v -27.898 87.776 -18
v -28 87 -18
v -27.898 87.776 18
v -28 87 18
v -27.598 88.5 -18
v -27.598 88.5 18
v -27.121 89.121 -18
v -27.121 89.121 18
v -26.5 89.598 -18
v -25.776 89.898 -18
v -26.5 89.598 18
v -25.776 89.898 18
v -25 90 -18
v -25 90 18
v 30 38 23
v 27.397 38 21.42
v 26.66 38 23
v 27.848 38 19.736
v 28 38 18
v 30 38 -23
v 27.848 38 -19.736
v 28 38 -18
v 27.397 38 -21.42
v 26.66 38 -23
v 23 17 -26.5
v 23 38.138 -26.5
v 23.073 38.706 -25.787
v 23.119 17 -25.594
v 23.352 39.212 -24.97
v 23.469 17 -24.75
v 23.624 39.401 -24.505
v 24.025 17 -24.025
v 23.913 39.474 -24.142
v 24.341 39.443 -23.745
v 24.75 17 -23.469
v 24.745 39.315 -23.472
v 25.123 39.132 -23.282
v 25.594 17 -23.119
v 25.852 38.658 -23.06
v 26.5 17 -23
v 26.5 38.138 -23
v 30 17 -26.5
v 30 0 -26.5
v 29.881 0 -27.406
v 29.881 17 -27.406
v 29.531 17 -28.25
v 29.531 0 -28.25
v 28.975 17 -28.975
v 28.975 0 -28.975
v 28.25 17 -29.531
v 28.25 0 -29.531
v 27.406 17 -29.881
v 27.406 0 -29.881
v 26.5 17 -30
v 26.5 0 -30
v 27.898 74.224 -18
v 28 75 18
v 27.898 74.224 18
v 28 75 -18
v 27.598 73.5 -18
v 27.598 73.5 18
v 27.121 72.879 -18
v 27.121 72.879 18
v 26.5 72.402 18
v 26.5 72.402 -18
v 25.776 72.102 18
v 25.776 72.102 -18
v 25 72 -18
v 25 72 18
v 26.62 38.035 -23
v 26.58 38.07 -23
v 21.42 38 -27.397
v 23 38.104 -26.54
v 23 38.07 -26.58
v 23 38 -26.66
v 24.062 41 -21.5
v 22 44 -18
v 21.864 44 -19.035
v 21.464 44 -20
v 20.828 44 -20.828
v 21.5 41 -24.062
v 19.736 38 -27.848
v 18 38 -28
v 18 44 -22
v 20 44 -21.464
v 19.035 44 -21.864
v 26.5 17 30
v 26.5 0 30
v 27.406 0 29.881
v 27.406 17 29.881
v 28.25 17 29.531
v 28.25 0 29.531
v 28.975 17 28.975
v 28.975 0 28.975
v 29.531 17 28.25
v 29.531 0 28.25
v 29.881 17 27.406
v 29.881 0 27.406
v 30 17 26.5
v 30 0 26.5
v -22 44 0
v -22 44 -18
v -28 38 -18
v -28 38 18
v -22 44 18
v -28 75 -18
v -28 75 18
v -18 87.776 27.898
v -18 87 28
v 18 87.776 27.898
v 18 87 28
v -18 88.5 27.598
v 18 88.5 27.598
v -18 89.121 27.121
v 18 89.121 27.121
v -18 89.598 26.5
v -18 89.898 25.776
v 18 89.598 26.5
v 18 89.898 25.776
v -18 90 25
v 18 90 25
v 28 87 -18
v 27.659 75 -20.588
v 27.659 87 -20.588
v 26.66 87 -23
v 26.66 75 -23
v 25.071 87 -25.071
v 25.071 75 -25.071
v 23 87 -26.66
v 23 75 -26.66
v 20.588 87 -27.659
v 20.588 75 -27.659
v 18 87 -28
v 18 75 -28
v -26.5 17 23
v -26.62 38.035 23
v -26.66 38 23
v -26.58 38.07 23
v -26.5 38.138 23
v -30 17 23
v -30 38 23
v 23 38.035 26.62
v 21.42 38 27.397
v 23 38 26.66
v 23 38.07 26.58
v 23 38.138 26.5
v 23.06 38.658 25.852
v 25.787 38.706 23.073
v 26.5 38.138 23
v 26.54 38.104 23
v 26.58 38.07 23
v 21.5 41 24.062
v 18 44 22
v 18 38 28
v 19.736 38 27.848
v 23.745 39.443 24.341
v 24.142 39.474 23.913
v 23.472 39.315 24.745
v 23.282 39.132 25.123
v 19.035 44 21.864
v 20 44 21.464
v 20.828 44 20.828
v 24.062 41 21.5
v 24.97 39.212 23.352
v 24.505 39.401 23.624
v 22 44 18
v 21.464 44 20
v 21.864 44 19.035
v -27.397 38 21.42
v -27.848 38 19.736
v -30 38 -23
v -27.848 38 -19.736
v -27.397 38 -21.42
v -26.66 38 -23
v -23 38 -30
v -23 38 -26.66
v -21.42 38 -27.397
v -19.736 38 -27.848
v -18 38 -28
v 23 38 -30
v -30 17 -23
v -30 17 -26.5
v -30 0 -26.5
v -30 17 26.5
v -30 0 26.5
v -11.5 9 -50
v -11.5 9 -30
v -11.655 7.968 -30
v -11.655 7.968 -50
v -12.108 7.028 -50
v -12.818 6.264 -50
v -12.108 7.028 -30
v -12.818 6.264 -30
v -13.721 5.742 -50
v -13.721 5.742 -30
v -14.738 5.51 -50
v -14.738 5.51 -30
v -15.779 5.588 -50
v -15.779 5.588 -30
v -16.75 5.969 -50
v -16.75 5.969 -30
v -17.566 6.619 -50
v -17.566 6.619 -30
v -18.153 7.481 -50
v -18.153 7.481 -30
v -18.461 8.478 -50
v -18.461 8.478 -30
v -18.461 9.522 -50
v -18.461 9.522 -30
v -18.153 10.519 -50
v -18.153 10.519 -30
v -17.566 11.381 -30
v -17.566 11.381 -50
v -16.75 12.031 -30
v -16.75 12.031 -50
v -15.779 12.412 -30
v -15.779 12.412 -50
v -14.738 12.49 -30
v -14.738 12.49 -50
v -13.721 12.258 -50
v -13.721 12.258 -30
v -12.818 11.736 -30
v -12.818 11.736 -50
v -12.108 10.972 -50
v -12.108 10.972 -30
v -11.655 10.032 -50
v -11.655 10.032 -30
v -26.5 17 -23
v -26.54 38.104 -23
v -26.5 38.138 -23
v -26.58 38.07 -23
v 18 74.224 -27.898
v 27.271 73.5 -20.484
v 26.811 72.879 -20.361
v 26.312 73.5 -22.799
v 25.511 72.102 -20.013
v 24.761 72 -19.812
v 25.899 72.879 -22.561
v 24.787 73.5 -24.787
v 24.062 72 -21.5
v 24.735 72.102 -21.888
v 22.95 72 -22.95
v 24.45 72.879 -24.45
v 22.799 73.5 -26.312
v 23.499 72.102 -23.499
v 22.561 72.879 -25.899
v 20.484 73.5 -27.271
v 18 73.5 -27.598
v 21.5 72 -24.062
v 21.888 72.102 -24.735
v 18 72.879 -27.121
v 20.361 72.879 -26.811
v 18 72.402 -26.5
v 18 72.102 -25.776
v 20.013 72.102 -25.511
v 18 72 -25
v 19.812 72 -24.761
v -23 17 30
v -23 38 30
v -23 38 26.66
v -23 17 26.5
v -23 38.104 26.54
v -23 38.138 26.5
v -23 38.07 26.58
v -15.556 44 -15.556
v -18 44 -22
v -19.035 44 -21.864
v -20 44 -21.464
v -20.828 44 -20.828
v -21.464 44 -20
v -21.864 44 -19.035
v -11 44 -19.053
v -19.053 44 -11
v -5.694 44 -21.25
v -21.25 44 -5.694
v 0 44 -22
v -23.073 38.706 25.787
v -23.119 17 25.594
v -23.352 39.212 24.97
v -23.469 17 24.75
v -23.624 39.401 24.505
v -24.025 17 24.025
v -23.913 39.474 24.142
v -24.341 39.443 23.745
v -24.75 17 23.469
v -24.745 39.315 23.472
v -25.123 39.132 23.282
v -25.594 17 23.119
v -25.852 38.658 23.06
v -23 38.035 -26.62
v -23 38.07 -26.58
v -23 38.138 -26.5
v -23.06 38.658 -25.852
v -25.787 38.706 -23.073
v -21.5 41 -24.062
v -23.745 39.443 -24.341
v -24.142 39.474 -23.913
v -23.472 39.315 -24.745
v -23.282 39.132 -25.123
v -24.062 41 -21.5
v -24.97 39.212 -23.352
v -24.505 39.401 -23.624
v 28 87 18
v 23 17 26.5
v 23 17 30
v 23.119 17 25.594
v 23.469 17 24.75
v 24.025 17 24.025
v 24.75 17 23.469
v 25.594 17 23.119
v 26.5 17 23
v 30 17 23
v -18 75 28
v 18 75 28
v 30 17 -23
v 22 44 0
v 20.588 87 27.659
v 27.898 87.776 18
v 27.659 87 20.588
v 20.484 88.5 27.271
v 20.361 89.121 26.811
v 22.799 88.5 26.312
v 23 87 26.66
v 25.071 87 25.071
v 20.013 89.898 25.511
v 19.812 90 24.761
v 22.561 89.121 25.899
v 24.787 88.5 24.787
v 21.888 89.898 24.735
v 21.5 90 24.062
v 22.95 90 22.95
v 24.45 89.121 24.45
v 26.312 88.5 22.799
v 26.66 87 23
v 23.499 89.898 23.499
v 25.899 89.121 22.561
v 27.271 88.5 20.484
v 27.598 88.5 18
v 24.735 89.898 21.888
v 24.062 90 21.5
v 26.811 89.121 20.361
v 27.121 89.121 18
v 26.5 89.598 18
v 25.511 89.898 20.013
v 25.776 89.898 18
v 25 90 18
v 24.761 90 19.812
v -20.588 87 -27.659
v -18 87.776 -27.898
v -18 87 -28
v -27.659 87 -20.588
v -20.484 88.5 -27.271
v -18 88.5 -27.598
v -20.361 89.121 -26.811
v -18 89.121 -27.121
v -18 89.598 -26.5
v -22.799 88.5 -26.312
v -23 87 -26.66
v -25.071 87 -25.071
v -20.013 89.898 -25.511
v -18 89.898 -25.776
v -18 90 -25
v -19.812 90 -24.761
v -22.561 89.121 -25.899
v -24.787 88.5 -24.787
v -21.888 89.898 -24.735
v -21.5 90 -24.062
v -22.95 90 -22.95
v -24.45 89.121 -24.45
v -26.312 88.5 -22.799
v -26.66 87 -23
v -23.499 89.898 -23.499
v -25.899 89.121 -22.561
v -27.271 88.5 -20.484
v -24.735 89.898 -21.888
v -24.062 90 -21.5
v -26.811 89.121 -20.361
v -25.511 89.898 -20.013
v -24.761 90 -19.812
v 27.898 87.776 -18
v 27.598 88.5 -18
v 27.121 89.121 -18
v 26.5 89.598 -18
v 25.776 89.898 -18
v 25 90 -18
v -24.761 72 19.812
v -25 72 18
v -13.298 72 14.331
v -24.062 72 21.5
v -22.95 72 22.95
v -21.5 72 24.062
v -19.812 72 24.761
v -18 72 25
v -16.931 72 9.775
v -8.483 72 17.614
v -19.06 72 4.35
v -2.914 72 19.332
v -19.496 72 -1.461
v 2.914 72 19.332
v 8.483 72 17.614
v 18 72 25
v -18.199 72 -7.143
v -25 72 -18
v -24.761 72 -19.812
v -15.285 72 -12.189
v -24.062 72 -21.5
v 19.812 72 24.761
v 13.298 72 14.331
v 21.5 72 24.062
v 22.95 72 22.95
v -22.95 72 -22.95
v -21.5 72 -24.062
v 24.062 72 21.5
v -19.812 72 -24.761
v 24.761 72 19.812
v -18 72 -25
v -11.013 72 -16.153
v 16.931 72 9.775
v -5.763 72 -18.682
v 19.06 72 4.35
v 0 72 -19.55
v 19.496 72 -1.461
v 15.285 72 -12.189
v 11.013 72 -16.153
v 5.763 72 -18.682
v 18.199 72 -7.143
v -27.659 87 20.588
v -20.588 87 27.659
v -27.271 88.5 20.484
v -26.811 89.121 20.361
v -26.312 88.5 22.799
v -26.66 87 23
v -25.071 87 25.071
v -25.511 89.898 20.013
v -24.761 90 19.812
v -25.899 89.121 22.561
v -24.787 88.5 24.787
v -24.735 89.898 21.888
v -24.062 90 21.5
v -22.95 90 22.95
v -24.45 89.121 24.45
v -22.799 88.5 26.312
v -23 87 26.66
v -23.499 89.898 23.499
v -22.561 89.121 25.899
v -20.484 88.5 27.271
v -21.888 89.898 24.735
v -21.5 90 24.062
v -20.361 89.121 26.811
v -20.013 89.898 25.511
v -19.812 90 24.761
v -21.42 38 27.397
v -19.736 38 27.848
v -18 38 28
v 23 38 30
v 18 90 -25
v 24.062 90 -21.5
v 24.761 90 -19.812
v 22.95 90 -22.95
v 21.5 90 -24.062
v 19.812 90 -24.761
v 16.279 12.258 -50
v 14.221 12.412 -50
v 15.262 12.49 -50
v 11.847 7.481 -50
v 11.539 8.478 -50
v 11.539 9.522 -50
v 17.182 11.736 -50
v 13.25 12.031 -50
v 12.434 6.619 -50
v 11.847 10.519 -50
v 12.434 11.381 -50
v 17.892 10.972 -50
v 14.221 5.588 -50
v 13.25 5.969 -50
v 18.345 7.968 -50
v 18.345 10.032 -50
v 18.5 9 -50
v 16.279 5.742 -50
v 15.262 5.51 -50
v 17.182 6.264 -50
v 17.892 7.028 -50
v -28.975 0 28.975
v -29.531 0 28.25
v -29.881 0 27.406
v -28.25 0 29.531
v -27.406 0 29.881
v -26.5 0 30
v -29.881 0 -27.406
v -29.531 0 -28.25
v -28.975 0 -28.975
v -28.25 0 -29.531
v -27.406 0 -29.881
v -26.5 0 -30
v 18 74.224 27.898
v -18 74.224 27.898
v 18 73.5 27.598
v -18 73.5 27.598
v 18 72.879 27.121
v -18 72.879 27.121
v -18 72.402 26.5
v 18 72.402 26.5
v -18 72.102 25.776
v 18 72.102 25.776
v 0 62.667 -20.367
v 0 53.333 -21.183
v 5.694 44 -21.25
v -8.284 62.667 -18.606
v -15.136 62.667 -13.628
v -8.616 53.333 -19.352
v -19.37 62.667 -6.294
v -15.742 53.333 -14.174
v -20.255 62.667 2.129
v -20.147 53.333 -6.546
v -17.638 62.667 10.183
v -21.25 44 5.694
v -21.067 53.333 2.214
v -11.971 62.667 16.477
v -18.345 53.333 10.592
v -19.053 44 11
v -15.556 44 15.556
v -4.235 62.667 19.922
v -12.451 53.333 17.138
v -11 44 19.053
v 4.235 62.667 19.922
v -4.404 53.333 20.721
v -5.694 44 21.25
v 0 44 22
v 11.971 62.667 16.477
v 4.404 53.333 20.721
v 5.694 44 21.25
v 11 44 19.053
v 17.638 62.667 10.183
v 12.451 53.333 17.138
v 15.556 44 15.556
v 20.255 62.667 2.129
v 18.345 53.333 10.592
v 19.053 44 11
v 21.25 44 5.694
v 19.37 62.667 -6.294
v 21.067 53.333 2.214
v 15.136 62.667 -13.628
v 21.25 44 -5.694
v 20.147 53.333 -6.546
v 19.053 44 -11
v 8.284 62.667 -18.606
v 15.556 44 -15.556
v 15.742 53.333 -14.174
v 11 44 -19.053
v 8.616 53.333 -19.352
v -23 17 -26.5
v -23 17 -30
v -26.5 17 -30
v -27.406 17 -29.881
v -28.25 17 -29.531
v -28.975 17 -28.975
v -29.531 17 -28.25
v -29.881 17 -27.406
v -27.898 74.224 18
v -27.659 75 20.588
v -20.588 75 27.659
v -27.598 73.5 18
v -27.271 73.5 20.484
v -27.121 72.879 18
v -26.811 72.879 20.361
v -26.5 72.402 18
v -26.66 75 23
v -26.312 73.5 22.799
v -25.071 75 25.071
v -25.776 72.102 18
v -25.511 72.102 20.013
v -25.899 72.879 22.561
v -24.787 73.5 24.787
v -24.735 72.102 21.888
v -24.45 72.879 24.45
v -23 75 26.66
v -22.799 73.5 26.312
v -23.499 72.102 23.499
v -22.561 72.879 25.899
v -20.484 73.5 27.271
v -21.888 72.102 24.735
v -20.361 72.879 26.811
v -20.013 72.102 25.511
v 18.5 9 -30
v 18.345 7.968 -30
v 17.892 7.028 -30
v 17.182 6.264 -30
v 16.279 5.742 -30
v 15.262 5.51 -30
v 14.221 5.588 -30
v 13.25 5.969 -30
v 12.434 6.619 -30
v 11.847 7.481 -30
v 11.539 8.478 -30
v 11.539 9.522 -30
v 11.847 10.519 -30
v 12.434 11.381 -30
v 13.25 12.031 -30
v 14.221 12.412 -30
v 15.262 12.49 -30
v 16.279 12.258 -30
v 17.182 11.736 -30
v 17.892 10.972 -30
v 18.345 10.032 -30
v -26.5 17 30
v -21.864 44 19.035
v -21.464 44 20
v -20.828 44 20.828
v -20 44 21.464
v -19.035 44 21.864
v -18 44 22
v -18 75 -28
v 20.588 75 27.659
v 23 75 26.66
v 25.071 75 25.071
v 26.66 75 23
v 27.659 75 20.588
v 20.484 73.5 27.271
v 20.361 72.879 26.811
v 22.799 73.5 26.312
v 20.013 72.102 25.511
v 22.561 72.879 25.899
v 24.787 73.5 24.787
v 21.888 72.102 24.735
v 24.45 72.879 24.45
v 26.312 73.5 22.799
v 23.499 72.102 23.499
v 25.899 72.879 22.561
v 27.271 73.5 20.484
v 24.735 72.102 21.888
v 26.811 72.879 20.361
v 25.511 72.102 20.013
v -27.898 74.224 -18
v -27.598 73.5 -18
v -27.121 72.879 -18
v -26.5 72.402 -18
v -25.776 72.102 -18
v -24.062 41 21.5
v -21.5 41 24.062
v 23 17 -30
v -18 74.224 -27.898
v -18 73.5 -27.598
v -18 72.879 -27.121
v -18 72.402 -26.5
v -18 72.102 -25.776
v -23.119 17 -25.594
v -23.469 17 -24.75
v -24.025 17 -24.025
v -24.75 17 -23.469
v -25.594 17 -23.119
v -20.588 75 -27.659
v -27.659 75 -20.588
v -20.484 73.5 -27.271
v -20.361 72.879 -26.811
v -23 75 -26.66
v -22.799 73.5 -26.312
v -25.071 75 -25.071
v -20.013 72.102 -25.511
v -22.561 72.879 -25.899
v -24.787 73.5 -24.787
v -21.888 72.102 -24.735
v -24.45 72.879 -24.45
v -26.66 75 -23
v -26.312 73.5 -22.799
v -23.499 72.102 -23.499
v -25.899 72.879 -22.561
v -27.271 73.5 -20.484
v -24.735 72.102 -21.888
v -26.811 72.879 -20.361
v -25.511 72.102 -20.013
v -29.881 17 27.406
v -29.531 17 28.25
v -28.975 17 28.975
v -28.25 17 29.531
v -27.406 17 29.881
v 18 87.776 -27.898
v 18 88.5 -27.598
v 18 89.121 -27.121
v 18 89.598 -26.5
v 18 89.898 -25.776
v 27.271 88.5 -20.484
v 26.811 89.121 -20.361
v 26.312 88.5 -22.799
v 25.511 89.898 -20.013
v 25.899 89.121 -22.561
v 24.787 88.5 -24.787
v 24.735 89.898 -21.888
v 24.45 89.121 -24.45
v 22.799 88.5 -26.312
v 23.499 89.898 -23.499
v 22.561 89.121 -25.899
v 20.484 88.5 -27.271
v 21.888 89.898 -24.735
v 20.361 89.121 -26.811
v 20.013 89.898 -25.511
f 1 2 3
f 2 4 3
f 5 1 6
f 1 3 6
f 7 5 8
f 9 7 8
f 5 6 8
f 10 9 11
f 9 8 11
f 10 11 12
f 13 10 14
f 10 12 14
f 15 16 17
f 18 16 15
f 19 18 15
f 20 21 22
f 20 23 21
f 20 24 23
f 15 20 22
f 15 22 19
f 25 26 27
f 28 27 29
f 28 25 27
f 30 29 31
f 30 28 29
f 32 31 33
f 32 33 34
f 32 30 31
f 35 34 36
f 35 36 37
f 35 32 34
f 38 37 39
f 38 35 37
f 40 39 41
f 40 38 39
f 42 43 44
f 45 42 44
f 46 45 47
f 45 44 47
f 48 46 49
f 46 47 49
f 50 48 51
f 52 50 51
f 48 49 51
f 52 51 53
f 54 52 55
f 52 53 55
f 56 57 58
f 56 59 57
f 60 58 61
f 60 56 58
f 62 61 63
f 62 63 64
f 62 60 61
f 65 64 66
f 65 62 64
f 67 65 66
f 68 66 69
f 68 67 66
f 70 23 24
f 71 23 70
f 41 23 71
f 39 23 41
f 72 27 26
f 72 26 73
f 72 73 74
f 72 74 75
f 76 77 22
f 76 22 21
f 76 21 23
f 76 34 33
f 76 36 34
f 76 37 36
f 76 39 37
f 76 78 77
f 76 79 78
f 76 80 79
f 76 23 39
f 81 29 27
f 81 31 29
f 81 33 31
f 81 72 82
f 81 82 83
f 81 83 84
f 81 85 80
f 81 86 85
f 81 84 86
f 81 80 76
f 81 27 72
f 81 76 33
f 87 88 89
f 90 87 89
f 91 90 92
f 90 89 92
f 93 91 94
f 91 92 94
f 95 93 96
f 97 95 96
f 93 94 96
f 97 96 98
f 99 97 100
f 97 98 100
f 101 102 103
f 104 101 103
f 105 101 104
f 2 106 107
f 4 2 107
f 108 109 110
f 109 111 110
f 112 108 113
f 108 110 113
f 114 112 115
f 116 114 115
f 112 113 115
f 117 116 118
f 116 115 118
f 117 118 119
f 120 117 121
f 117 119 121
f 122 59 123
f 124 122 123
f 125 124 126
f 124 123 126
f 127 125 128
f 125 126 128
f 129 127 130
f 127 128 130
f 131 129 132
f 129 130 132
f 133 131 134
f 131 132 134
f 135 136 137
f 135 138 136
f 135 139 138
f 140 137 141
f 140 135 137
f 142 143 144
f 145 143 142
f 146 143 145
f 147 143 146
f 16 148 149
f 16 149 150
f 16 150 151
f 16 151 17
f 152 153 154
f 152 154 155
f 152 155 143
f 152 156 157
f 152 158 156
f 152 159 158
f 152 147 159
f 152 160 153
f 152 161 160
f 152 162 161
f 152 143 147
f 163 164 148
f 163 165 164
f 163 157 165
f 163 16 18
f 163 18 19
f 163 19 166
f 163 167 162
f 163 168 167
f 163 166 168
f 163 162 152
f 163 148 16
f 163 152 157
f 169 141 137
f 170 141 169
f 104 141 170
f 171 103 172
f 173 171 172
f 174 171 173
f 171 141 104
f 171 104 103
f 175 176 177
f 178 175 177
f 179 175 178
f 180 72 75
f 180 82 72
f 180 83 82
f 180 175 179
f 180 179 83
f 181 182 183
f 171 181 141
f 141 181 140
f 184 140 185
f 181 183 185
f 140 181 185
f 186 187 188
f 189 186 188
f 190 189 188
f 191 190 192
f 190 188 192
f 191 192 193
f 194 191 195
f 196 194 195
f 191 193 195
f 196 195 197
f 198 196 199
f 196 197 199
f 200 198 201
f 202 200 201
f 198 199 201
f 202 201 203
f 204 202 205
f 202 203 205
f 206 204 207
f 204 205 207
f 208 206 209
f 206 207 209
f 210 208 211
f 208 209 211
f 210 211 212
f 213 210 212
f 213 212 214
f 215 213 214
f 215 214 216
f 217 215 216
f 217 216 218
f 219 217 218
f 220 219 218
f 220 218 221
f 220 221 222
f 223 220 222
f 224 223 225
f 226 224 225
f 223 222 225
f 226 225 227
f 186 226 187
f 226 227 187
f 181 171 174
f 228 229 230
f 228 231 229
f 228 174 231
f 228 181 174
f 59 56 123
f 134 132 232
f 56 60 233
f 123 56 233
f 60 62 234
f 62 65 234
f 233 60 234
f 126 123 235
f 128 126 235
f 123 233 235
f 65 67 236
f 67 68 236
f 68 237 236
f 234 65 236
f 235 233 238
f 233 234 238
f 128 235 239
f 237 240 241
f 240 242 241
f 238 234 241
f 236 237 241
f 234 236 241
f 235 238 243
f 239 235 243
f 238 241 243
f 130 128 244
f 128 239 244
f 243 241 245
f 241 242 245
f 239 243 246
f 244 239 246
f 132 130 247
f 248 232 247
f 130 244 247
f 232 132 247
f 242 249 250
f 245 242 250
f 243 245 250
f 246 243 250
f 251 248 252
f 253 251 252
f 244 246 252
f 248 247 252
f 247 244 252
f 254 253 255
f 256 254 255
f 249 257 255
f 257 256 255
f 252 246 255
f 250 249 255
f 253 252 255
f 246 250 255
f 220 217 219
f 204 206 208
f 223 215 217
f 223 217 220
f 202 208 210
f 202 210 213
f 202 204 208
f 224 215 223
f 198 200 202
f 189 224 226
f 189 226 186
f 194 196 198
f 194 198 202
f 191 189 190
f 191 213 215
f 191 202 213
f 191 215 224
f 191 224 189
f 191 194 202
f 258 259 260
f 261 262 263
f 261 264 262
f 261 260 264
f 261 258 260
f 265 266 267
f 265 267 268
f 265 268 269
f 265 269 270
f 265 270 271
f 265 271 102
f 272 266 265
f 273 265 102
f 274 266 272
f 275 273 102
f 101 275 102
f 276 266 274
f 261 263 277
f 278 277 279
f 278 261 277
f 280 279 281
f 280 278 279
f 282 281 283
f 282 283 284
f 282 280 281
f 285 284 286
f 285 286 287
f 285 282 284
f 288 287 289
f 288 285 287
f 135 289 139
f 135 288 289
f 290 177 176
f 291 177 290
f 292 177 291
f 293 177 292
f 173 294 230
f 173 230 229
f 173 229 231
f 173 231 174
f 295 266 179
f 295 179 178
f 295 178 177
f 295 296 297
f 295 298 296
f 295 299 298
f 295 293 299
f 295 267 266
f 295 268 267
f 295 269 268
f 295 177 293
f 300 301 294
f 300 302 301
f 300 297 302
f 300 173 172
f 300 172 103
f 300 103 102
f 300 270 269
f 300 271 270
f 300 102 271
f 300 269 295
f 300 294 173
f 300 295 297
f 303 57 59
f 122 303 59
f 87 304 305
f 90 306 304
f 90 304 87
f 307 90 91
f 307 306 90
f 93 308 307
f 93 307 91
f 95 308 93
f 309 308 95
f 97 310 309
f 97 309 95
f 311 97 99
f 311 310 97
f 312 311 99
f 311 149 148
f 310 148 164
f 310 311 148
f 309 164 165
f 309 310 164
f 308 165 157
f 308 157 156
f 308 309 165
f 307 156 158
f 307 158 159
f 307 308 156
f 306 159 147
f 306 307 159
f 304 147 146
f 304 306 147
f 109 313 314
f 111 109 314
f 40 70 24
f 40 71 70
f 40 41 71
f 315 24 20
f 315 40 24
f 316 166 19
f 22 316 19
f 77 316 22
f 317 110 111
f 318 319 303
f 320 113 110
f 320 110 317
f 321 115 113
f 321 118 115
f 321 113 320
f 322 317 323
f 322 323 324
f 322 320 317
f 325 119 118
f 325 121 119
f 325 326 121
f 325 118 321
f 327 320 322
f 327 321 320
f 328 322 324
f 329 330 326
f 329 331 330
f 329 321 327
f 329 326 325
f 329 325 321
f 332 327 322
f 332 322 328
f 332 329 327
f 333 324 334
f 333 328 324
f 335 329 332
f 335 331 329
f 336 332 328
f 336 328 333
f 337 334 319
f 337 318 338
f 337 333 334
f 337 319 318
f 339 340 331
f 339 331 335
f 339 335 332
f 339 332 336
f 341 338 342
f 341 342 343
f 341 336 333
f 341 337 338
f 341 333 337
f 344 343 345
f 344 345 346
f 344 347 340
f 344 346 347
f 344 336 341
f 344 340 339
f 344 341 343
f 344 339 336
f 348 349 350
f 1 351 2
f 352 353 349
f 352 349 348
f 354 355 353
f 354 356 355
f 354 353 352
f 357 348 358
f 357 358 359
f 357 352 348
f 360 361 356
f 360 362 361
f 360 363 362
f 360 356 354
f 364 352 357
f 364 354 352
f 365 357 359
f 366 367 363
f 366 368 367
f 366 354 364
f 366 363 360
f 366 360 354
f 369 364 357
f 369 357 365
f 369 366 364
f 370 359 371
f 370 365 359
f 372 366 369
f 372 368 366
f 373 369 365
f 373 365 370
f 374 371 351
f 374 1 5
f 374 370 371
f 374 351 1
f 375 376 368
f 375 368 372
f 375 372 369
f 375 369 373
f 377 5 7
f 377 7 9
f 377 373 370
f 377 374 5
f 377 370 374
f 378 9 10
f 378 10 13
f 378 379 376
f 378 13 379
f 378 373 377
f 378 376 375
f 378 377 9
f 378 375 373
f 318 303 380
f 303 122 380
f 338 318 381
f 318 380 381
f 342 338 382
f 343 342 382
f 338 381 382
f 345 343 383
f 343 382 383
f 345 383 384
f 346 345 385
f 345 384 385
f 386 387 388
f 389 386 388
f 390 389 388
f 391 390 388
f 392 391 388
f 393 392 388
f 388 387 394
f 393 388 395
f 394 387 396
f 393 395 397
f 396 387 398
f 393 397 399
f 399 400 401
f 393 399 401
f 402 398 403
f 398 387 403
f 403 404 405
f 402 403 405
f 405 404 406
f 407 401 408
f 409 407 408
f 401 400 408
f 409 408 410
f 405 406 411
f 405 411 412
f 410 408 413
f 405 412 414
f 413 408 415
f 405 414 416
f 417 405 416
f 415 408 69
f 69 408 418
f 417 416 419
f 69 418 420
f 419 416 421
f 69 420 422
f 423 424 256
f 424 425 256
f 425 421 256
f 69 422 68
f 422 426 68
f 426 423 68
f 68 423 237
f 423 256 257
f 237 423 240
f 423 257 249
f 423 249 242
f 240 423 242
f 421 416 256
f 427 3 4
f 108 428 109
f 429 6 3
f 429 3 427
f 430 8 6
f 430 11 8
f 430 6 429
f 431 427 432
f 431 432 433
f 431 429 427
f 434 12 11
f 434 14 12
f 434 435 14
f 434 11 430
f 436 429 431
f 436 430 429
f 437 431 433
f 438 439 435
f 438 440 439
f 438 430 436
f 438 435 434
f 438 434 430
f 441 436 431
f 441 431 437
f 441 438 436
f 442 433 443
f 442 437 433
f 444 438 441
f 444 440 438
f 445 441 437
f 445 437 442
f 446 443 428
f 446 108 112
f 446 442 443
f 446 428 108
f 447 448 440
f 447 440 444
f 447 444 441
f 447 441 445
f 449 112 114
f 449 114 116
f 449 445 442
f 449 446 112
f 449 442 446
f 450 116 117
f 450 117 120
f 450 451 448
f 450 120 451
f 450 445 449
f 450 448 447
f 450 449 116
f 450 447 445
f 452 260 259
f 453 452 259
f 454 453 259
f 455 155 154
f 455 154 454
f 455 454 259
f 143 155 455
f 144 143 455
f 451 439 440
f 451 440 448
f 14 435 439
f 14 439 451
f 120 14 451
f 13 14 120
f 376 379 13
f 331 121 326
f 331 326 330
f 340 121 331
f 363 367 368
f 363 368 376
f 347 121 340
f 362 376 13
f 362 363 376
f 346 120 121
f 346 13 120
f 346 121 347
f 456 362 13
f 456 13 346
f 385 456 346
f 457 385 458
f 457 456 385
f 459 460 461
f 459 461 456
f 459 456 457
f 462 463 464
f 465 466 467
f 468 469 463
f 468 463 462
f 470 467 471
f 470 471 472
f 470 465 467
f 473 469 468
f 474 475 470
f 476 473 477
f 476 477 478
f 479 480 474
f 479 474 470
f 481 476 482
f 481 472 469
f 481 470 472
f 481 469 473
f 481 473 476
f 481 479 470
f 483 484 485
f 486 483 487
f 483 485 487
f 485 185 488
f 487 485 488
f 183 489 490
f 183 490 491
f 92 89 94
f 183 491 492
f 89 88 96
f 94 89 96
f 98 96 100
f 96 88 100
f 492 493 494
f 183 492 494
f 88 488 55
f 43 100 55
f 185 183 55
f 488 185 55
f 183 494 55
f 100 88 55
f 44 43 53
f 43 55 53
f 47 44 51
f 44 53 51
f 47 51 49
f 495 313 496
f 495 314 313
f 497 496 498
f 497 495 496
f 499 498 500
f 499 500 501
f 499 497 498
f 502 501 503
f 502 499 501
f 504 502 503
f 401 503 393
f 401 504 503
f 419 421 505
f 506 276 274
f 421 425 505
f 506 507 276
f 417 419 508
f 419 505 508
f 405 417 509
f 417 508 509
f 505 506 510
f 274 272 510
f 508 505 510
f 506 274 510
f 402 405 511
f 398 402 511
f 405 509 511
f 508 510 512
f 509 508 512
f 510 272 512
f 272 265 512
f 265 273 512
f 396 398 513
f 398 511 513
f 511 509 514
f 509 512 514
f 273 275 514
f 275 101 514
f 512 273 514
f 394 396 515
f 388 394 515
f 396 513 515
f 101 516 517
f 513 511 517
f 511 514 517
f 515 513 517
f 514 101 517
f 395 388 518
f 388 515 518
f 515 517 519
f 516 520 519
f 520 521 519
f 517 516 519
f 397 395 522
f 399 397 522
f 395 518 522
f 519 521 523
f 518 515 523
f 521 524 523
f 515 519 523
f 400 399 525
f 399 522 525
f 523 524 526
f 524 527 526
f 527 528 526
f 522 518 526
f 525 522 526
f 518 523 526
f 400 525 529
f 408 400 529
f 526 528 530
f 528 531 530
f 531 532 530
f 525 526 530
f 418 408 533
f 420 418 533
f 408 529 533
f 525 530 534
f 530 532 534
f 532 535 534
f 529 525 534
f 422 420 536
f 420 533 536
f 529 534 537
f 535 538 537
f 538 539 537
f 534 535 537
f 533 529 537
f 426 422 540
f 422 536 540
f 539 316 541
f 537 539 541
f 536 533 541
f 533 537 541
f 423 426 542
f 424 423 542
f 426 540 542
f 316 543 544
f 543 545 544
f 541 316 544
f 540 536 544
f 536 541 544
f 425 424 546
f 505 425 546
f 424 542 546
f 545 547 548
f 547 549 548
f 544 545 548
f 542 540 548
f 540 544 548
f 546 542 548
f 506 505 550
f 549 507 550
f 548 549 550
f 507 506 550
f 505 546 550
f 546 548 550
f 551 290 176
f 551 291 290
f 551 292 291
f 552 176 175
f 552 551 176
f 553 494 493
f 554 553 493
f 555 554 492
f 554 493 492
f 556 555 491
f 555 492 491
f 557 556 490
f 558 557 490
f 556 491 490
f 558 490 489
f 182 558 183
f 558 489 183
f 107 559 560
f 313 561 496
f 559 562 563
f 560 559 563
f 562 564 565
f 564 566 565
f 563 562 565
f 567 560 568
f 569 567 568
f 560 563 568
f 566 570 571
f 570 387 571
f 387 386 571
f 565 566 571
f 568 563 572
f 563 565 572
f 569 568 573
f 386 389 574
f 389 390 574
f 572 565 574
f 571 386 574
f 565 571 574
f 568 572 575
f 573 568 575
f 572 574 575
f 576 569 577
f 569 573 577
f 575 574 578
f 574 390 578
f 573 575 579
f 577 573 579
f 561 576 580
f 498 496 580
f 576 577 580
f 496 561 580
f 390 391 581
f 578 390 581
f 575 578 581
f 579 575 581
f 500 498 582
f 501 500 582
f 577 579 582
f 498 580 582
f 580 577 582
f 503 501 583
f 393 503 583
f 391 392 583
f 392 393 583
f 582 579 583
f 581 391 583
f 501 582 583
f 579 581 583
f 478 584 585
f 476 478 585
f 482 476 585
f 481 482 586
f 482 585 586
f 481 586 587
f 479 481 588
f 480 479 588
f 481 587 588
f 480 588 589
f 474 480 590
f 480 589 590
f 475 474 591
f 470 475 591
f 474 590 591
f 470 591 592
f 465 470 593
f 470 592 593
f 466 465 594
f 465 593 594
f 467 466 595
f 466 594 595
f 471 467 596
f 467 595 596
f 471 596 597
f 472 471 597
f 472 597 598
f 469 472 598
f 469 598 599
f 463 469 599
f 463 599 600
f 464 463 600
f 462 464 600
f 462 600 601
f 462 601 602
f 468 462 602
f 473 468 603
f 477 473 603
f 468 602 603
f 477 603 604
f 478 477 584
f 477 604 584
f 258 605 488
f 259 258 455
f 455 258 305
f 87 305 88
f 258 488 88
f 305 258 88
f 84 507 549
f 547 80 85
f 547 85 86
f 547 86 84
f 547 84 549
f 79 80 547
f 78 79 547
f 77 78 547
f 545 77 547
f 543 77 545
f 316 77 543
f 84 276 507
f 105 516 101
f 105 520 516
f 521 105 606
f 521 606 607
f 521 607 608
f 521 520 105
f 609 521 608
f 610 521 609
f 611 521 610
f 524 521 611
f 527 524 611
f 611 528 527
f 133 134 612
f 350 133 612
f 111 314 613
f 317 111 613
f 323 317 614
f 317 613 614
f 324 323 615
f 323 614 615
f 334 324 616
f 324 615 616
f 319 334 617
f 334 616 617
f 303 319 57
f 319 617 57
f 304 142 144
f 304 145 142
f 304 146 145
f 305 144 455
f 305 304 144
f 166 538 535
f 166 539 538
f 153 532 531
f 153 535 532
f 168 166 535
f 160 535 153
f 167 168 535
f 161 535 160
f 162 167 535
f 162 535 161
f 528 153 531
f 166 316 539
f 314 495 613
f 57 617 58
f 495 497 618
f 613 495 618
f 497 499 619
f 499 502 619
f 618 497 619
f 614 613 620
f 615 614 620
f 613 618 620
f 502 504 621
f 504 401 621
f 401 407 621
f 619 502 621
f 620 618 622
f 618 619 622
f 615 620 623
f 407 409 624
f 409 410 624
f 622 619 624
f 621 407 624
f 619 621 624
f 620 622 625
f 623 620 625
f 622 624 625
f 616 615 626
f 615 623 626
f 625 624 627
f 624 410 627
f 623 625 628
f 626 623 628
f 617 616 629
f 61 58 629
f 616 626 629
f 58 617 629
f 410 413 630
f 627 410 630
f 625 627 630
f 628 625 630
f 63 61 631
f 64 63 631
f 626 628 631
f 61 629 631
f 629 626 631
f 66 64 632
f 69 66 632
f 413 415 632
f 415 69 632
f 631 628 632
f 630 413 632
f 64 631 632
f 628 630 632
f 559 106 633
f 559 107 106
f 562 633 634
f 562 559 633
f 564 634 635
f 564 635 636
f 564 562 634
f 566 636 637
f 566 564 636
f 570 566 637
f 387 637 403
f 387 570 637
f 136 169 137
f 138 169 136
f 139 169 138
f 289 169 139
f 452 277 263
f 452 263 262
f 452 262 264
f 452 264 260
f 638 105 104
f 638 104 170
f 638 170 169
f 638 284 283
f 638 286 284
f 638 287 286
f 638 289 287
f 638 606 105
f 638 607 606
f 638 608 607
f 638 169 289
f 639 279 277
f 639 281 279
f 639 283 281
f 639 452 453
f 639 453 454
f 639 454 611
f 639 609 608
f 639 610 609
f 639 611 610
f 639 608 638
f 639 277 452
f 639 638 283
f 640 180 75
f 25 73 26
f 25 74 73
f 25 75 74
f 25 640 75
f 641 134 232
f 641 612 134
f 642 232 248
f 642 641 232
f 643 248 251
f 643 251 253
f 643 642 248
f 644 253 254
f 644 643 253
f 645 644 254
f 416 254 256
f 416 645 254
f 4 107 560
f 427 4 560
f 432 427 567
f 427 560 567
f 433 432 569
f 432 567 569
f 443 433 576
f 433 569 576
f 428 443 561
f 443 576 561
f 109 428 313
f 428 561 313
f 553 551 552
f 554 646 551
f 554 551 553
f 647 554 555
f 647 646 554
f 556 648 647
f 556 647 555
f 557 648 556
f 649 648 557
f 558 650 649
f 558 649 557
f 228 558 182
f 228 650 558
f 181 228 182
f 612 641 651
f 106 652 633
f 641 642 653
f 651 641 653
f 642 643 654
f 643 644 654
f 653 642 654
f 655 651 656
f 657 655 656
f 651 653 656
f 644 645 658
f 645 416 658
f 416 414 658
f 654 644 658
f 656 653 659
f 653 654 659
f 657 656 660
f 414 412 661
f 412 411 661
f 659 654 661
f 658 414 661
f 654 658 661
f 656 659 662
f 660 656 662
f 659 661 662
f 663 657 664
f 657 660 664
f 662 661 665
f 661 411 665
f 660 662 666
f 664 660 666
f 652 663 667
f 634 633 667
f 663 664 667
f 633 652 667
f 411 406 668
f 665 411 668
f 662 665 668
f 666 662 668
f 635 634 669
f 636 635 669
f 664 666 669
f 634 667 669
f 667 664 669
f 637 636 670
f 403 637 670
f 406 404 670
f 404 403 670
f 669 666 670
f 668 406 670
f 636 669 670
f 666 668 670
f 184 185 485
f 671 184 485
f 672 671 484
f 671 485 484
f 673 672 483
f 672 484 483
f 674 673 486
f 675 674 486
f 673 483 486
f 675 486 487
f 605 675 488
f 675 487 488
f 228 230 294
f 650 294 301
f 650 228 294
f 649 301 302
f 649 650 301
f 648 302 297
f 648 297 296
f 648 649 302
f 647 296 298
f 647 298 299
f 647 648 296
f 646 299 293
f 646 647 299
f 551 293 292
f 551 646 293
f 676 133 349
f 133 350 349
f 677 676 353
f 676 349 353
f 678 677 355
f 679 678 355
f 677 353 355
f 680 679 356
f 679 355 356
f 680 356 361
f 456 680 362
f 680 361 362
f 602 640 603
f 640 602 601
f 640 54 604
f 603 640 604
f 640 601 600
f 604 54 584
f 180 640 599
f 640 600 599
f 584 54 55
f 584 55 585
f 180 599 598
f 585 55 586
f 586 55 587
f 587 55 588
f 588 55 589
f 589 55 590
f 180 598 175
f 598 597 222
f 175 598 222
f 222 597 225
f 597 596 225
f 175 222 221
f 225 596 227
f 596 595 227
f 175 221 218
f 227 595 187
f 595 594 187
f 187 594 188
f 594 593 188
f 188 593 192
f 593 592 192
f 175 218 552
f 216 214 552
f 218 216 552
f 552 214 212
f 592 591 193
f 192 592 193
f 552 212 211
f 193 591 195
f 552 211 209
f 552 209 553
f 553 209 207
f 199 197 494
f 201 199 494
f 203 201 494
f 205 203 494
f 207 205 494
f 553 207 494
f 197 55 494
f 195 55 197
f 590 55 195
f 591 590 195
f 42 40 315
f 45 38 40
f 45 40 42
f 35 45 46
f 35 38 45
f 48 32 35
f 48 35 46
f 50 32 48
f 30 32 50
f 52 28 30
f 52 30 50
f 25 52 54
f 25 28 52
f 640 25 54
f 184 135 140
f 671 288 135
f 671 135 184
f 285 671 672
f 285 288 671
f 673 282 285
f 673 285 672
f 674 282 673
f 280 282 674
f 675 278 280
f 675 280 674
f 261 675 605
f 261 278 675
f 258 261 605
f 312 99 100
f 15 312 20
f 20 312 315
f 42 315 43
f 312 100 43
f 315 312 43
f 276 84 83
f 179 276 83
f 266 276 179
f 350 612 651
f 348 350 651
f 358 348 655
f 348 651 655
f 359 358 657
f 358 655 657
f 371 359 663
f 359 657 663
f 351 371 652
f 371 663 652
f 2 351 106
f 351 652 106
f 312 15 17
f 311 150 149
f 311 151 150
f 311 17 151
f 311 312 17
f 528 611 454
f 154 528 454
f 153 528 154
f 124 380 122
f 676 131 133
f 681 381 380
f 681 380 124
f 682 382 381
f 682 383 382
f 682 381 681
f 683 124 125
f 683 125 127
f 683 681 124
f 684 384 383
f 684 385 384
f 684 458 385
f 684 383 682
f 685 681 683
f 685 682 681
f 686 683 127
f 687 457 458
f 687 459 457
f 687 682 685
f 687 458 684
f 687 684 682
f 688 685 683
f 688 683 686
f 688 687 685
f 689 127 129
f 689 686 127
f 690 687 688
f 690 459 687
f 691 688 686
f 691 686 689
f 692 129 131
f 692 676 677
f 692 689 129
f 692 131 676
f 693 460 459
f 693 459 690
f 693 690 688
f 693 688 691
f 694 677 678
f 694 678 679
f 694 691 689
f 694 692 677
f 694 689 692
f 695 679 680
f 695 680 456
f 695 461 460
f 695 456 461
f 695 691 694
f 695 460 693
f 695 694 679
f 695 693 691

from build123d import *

# Parameters (mm, degrees)
BOSS_EXTRUDE1_DEPTH = 38
BOSS_EXTRUDE2_DEPTH = 6
BOSS_EXTRUDE2_TAPER = 45
CUT_EXTRUDE3_START  = -21
CUT_EXTRUDE3_DEPTH  = 78.956123464
CIRPATTERN1_COUNT   = 4
SKETCH5_R           = 3.5
BOSS_EXTRUDE3_DEPTH = 20
BOSS_EXTRUDE4_DEPTH = 18
FILLET1_R           = 3


with BuildPart() as part:
    # Sketch1 → Boss-Extrude1 (new body)
    with BuildSketch(Plane(origin=(0, 0, 0), x_dir=(1, 0, 0), z_dir=(0, 1, 0))):
        with BuildLine():
            Line((-26.5, -30), (26.5, -30))
            ThreePointArc((26.5, -30), (28.974873734, -28.974873734), (30, -26.5))
            Line((30, -26.5), (30, 26.5))
            ThreePointArc((30, 26.5), (28.974873734, 28.974873734), (26.5, 30))
            Line((26.5, 30), (-26.5, 30))
            ThreePointArc((-26.5, 30), (-28.974873734, 28.974873734), (-30, 26.5))
            Line((-30, 26.5), (-30, -26.5))
            ThreePointArc((-30, -26.5), (-28.974873734, -28.974873734), (-26.5, -30))
        make_face()
    extrude(amount=BOSS_EXTRUDE1_DEPTH)

    # Sketch2 → Boss-Extrude2 (add)
    with BuildSketch(Plane(origin=(0, 38, 0), x_dir=(1, 0, 0), z_dir=(0, 1, 0))):
        with BuildLine():
            Line((-18, -28), (18, -28))
            ThreePointArc((18, -28), (25.071067812, -25.071067812), (28, -18))
            Line((28, -18), (28, 18))
            ThreePointArc((28, 18), (25.071067812, 25.071067812), (18, 28))
            Line((18, 28), (-18, 28))
            ThreePointArc((-18, 28), (-25.071067812, 25.071067812), (-28, 18))
            Line((-28, 18), (-28, -18))
            ThreePointArc((-28, -18), (-25.071067812, -25.071067812), (-18, -28))
        make_face()
    extrude(amount=BOSS_EXTRUDE2_DEPTH, taper=BOSS_EXTRUDE2_TAPER)

    # Sketch3 → Cut-Extrude3 (cut)
    with BuildSketch(Plane(origin=(0, 38, 0), x_dir=(1, 0, 0), z_dir=(0, 1, 0)).offset(CUT_EXTRUDE3_START)):
        with BuildLine():
            ThreePointArc((26.660254038, -23), (25.071067812, -25.071067812), (23, -26.660254038))
            Line((23, -26.660254038), (23, -30))
            Line((23, -30), (26.5, -30))
            ThreePointArc((26.5, -30), (28.974873734, -28.974873734), (30, -26.5))
            Line((30, -26.5), (30, -23))
            Line((30, -23), (26.660254038, -23))
        make_face()
        with BuildLine():
            ThreePointArc((26.5, -23), (24.025126266, -24.025126266), (23, -26.5))
            Line((23, -26.5), (23, -26.660254038))
            ThreePointArc((23, -26.660254038), (25.071067812, -25.071067812), (26.660254038, -23))
            Line((26.660254038, -23), (26.5, -23))
        make_face()
    cut_extrude3 = extrude(amount=CUT_EXTRUDE3_DEPTH, mode=Mode.SUBTRACT)

    # CirPattern1: Cut-Extrude3 ×4 about axis
    cirpattern1_axis = Axis((0, 0, 0), (0, 1, 0))
    for i in range(1, CIRPATTERN1_COUNT):
        add(cut_extrude3.rotate(cirpattern1_axis, i * 360 / CIRPATTERN1_COUNT), mode=Mode.SUBTRACT)

    # Sketch4 → Revolve1 (revolve)
    with BuildSketch(Plane.XY, mode=Mode.PRIVATE) as revolve1_sk:
        Polygon((0, 44), (0, 72), (19.550317421, 72), (22, 44), align=None)
    revolve(revolve1_sk.sketch.rotate(Axis((0, -2.2, 0), (0, 1, 0)), 90), axis=Axis((0, -2.2, 0), (0, 1, 0)))

    # Sketch5 → Boss-Extrude3 (add)
    with BuildSketch(Plane(origin=(0, 0, -30), x_dir=(-1, 0, 0), z_dir=(0, 0, -1))):
        with Locations(Location((-15, 9, 0), (0, 0, 180))):
            Circle(SKETCH5_R)
        with Locations(Location((15, 9, 0), (0, 0, 180))):
            Circle(SKETCH5_R)
    extrude(amount=BOSS_EXTRUDE3_DEPTH)

    # Sketch6 → Boss-Extrude4 (add)
    with BuildSketch(Plane(origin=(0, 72, 0), x_dir=(1, 0, 0), z_dir=(0, 1, 0))):
        with BuildLine():
            Line((-18, -28), (18, -28))
            ThreePointArc((18, -28), (25.071067812, -25.071067812), (28, -18))
            Line((28, -18), (28, 18))
            ThreePointArc((28, 18), (25.071067812, 25.071067812), (18, 28))
            Line((18, 28), (-18, 28))
            ThreePointArc((-18, 28), (-25.071067812, 25.071067812), (-28, 18))
            Line((-28, 18), (-28, -18))
            ThreePointArc((-28, -18), (-25.071067812, -25.071067812), (-18, -28))
        make_face()
    extrude(amount=BOSS_EXTRUDE4_DEPTH)

    # Fillet1
    fillet1_edges = [part.edges().sort_by_distance(p)[0] for p in [
        (25.071067812, 72, 25.071067812),
        (28, 72, 0),
        (25.071067812, 72, -25.071067812),
        (0, 72, -28),
        (-25.071067812, 72, -25.071067812),
        (-28, 72, 0),
        (-25.071067812, 72, 25.071067812),
        (0, 72, 28),
        (25.071067812, 90, 25.071067812),
        (28, 90, 0),
        (25.071067812, 90, -25.071067812),
        (0, 90, -28),
        (-25.071067812, 90, -25.071067812),
        (-28, 90, 0),
        (-25.071067812, 90, 25.071067812),
        (0, 90, 28),
    ]]
    fillet(fillet1_edges, radius=FILLET1_R)


solid = part.part
